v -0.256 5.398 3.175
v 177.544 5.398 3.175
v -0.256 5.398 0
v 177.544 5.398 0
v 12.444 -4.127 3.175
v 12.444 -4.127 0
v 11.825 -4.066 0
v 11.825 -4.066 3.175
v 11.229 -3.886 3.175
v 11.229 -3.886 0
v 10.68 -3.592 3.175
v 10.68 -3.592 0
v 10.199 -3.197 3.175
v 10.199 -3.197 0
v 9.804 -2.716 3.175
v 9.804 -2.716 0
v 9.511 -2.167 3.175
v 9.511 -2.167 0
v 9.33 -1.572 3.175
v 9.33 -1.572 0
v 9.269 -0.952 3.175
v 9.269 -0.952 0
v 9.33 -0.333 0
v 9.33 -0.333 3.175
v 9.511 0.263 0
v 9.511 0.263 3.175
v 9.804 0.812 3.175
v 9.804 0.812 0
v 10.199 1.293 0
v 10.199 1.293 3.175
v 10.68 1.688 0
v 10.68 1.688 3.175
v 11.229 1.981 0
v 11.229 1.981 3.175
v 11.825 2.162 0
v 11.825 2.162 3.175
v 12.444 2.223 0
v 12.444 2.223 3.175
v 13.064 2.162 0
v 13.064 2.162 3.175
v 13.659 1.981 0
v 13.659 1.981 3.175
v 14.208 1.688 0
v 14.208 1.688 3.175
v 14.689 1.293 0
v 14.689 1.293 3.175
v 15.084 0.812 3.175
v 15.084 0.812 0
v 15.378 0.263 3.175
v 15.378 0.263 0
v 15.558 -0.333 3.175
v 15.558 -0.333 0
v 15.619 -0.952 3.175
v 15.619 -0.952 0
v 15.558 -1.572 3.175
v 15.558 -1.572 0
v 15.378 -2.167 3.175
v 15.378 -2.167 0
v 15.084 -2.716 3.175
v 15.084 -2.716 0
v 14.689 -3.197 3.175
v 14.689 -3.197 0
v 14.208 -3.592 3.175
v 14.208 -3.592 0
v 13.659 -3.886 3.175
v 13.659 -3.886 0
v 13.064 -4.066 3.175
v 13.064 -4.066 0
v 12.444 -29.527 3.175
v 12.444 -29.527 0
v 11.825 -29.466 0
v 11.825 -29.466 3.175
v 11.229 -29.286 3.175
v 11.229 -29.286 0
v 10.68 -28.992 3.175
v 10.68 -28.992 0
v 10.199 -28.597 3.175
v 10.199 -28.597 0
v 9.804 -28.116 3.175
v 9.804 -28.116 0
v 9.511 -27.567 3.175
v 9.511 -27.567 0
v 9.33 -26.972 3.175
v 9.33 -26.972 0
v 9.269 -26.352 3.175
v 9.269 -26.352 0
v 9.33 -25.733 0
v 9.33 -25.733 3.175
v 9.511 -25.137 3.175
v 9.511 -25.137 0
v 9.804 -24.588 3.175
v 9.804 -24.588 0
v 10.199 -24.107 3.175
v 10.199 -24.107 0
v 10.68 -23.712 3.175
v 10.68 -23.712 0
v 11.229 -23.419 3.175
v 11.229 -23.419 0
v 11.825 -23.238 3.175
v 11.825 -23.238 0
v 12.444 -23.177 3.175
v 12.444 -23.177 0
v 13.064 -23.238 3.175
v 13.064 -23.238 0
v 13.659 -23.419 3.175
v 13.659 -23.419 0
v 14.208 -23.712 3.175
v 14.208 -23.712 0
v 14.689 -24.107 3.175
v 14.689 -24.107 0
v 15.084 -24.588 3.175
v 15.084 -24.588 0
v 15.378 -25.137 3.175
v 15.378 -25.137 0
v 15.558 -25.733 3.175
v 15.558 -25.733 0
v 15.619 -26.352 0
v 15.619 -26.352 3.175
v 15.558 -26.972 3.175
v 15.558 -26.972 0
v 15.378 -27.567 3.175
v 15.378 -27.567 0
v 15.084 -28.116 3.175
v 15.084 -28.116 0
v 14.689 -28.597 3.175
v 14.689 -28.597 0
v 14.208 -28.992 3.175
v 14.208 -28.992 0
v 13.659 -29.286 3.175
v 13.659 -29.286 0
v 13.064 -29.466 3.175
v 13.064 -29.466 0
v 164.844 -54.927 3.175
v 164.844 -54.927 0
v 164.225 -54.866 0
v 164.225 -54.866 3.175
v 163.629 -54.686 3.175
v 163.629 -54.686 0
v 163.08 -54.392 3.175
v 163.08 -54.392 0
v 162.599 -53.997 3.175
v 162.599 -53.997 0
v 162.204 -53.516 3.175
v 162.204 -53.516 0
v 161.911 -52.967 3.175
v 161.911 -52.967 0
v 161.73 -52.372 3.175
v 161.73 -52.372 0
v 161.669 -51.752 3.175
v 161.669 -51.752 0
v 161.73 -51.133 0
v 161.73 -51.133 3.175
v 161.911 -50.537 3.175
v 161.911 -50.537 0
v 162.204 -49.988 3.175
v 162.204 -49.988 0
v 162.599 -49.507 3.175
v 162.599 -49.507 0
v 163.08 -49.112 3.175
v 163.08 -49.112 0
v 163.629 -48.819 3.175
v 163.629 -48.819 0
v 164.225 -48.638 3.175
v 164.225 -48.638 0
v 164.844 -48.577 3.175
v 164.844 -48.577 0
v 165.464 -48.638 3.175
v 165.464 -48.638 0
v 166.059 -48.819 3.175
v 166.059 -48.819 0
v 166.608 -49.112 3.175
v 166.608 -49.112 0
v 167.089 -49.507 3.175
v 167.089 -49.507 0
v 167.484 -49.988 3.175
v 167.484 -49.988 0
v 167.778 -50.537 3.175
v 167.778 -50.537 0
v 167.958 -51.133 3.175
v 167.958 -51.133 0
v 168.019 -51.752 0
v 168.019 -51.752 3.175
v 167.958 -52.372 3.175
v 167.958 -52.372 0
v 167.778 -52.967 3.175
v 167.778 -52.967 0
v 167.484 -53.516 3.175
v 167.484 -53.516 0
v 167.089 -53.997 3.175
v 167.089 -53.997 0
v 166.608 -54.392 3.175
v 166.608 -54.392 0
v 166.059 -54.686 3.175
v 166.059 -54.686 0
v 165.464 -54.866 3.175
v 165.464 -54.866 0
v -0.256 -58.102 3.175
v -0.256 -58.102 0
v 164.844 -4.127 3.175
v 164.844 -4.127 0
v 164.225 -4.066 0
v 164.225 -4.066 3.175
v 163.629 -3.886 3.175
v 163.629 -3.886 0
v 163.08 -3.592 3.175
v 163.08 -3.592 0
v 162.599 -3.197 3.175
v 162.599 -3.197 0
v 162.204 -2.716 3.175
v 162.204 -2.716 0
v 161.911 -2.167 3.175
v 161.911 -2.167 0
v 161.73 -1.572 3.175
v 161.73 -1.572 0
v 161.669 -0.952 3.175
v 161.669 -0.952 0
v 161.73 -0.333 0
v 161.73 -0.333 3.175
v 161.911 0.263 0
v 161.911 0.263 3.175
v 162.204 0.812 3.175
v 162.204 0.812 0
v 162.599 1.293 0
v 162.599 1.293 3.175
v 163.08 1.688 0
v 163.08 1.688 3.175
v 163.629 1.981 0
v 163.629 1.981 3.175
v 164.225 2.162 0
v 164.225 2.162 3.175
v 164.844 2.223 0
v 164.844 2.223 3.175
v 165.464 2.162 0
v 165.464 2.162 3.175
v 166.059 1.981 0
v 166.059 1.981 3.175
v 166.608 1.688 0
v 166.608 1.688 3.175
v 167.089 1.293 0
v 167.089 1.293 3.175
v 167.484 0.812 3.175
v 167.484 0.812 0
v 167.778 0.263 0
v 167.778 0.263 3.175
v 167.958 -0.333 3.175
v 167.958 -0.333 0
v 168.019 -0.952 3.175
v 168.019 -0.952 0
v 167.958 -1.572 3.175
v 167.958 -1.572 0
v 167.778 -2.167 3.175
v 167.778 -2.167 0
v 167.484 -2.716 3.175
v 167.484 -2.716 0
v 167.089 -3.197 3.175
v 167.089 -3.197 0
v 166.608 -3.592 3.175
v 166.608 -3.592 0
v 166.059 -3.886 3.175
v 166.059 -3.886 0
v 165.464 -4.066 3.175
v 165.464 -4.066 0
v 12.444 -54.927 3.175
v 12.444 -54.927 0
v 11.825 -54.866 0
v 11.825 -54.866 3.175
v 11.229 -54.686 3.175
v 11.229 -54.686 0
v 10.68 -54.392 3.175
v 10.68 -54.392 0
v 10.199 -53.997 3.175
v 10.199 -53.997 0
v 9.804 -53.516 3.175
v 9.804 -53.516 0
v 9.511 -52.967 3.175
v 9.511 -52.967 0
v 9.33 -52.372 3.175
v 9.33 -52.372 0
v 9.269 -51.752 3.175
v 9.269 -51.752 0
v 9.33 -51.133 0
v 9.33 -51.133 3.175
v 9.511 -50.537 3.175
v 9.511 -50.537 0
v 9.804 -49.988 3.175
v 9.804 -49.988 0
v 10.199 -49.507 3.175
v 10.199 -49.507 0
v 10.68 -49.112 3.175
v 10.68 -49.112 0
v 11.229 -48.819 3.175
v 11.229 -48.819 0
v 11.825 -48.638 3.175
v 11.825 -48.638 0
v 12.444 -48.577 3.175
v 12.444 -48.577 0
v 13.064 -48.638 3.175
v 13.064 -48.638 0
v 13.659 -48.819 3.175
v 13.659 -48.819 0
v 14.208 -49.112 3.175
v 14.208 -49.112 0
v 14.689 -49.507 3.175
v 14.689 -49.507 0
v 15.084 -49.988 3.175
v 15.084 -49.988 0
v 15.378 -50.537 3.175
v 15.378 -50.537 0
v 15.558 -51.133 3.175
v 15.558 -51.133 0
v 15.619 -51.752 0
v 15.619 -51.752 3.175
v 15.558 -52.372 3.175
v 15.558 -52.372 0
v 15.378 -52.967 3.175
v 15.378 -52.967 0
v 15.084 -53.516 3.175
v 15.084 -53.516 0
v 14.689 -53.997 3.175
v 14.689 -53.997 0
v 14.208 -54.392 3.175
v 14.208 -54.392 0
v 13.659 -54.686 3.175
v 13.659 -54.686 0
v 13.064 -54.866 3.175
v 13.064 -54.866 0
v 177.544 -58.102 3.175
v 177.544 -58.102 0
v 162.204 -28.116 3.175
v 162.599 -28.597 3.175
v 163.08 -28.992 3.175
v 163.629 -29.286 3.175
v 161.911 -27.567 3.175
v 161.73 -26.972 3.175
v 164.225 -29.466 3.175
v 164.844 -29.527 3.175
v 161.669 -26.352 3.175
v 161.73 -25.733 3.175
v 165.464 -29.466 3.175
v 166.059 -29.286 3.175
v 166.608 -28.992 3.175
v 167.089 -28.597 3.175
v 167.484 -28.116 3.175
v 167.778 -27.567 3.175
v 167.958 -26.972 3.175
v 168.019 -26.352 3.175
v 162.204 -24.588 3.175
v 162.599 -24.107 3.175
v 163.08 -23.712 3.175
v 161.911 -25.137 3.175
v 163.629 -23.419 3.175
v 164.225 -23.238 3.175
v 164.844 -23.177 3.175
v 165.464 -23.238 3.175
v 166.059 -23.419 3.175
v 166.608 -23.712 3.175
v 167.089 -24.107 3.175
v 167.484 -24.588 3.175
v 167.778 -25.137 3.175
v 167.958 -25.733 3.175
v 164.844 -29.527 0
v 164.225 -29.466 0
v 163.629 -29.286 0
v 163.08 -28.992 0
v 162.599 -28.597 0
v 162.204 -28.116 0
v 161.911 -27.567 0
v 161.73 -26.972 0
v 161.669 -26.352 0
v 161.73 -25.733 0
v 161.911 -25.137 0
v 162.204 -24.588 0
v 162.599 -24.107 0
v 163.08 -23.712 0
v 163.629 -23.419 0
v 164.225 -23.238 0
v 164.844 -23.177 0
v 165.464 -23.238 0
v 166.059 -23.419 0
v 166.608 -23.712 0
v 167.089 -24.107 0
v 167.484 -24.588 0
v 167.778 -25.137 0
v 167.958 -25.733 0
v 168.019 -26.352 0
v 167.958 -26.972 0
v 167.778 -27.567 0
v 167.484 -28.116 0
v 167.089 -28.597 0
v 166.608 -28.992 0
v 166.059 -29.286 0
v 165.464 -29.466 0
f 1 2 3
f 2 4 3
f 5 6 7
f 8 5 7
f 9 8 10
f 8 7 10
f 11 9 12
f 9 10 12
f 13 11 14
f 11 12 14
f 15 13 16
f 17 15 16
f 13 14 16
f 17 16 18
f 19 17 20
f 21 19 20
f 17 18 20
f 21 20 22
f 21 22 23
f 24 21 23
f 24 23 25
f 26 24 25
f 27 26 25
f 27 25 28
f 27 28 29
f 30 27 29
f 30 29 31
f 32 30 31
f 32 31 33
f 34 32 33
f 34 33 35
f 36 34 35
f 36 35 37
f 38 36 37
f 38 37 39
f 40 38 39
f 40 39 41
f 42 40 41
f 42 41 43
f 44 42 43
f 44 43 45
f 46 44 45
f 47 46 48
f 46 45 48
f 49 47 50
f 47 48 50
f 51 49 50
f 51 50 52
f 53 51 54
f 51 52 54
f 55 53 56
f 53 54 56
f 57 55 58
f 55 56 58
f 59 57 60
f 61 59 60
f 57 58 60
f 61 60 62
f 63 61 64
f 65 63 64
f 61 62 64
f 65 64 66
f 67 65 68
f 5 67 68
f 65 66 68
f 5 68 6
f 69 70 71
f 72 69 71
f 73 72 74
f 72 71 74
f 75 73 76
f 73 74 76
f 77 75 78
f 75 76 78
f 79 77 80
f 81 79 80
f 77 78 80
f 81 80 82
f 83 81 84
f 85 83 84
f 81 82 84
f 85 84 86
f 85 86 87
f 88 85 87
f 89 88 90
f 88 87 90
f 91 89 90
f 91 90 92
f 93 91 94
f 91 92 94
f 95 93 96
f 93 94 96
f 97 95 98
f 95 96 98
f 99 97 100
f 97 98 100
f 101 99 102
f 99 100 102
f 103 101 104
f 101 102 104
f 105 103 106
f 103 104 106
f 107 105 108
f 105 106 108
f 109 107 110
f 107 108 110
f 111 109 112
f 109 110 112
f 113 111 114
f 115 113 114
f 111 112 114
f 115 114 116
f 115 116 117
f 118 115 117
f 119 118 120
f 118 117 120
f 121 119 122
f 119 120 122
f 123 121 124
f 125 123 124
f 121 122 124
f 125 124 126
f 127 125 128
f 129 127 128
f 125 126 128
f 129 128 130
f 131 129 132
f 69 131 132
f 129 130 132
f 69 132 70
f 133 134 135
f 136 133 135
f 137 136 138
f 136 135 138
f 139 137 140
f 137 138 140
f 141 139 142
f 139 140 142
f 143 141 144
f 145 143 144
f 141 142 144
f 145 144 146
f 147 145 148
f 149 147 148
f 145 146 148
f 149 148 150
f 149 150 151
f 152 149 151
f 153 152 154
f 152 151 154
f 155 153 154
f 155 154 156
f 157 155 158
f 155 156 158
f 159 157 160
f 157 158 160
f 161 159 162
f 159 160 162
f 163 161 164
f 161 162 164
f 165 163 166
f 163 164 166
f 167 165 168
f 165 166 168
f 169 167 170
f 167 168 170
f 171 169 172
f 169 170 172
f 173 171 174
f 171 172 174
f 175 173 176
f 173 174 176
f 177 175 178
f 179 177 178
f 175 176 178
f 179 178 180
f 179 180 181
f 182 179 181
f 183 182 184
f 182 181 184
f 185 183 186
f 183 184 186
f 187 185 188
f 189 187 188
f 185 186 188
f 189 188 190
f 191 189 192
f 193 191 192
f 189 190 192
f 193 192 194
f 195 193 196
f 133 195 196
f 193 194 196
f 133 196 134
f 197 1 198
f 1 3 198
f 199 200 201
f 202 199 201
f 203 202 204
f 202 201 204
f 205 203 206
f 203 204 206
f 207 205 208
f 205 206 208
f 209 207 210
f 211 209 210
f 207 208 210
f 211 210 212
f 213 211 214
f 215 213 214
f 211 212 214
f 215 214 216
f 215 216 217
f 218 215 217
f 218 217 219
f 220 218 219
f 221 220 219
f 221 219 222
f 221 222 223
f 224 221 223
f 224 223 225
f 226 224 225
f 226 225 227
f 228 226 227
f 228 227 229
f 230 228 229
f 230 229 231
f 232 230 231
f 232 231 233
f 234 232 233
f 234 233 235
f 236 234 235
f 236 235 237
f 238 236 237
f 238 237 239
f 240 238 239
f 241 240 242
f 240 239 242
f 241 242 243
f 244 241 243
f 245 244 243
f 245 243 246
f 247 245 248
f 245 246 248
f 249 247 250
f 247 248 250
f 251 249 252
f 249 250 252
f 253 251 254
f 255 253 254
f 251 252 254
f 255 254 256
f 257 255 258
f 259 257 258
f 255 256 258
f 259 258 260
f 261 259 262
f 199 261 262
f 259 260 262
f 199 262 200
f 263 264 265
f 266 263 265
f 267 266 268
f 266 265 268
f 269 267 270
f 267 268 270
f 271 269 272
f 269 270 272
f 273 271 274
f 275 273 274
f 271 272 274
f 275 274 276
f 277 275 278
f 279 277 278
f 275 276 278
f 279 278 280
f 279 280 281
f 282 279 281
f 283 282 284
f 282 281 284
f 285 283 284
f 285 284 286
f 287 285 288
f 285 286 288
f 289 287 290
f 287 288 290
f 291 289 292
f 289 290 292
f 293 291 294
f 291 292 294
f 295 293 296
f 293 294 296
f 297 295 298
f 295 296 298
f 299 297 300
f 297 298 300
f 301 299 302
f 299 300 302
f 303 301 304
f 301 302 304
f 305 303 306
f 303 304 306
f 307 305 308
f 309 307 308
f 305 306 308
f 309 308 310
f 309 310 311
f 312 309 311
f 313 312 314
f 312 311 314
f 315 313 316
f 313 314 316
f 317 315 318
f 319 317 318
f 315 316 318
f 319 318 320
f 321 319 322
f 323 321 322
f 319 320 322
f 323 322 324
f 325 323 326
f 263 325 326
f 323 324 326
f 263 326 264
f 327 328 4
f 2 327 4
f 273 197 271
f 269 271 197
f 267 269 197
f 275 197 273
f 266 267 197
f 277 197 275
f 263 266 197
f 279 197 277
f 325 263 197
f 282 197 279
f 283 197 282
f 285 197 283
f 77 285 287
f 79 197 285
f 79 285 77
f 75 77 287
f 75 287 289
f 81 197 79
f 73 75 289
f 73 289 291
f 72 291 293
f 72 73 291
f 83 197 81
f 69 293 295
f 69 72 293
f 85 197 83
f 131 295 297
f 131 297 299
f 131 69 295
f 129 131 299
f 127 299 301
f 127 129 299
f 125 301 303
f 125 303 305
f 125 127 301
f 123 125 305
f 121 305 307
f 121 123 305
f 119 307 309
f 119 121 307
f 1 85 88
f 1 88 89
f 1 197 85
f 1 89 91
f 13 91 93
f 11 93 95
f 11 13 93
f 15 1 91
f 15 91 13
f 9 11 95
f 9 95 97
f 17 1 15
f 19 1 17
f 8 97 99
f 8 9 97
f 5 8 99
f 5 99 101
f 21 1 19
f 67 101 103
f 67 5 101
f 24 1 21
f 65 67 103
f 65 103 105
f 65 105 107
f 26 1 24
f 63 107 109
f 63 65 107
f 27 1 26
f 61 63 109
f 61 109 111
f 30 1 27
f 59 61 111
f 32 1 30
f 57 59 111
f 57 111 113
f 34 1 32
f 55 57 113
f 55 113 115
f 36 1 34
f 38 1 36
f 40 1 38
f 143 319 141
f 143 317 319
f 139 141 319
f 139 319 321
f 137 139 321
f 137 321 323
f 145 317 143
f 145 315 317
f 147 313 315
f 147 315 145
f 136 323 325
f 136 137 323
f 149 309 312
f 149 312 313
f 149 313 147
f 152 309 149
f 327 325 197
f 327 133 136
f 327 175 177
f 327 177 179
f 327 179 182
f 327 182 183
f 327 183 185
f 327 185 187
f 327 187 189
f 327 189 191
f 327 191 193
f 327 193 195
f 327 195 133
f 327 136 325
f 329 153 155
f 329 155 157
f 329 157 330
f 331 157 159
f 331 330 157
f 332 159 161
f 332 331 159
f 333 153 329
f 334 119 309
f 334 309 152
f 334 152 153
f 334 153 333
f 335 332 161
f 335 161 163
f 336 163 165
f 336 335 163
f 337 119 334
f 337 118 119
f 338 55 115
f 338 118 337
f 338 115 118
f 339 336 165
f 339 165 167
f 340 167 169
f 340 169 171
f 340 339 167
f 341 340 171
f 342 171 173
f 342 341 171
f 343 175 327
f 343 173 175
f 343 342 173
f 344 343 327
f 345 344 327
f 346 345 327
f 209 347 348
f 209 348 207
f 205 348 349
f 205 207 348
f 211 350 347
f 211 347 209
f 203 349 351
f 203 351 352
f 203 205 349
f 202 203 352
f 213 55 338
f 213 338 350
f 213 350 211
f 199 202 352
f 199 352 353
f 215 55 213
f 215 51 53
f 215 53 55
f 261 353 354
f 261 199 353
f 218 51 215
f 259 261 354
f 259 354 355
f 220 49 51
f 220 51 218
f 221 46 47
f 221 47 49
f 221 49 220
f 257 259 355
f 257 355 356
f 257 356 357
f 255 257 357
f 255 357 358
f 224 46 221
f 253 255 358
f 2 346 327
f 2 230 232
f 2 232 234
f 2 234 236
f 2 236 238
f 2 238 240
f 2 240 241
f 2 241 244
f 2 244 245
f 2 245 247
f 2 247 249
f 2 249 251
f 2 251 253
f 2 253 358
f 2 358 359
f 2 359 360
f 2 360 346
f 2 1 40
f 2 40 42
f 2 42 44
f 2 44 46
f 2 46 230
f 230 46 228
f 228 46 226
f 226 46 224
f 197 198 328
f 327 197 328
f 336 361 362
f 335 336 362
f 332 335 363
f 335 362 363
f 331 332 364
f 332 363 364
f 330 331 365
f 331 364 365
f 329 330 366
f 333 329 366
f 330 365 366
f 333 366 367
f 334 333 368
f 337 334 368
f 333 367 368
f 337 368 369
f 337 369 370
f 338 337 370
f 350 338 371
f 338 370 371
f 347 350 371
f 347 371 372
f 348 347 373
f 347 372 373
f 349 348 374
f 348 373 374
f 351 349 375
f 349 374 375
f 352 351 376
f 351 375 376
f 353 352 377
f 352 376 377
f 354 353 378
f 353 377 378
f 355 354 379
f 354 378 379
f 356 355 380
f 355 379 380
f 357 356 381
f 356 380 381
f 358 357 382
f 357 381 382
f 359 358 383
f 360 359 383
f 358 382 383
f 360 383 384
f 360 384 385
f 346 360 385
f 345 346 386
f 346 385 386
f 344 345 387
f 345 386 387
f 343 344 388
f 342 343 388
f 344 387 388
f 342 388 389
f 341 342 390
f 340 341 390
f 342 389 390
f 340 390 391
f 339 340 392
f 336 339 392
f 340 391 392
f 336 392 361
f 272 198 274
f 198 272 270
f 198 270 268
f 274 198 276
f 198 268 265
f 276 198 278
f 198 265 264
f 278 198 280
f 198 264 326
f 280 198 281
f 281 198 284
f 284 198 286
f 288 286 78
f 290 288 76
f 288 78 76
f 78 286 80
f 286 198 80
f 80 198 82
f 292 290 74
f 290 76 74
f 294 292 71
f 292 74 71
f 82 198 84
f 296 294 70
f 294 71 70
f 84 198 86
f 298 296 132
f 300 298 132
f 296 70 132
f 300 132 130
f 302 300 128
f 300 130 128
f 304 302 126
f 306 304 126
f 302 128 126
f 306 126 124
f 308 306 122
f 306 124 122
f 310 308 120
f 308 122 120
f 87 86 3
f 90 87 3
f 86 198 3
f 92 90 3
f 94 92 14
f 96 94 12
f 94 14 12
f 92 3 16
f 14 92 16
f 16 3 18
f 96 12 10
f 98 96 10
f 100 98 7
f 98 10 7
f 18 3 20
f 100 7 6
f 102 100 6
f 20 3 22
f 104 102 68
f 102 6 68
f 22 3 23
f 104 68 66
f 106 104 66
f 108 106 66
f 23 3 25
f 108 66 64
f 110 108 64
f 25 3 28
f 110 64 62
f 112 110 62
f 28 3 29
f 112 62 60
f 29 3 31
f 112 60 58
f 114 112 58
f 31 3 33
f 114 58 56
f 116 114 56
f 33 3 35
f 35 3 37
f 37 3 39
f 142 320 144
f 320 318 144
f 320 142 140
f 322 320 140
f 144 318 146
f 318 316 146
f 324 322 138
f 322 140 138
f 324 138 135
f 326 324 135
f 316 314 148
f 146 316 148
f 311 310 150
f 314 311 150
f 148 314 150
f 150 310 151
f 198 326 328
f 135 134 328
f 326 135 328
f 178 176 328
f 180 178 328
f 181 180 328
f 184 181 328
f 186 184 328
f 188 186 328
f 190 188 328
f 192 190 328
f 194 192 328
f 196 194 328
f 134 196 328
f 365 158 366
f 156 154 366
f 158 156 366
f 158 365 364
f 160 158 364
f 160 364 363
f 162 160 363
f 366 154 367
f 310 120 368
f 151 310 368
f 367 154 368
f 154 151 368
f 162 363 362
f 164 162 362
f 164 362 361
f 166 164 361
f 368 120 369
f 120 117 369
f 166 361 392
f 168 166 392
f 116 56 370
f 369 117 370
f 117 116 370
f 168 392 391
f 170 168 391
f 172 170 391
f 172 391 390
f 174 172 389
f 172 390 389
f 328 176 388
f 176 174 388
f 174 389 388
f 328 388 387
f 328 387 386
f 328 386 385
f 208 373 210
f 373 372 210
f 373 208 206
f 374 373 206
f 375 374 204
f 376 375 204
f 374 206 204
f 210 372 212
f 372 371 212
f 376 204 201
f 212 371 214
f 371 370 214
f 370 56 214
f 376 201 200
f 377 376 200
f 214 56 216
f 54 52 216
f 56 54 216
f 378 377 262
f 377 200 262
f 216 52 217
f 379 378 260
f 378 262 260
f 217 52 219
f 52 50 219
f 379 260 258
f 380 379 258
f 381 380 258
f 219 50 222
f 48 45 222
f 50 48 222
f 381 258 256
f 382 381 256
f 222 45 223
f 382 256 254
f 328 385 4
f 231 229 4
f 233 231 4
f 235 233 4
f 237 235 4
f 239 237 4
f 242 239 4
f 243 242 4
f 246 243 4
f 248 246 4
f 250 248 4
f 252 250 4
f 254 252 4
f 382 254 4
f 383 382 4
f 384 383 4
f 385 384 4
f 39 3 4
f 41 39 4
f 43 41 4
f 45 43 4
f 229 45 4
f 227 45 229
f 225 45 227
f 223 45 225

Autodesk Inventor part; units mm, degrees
ref_plane "YZ Plane" through (0, 0, 0) normal (1, 0, 0) x (0, 1, 0)
ref_plane "XZ Plane" through (0, 0, 0) normal (0, 1, 0) x (-1, 0, 0)
ref_plane "XY Plane" through (0, 0, 0) normal (0, 0, 1) x (1, 0, 0)
sketch "Sketch1" plane through (0, 0, 0) normal (0, 0, 1) x (1, 0, 0)
  line L0 (-0.2558, -58.1023) -> (177.5442, -58.1023)
  line L1 (177.5442, -58.1023) -> (177.5442, 5.3977)
  line L2 (177.5442, 5.3977) -> (-0.2558, 5.3977)
  line L3 (-0.2558, 5.3977) -> (-0.2558, -58.1023)
  point P0 (0, 0)
  dimension "d0" = 177.8
  dimension "d1" = 63.5
extrude "Extrusion1" add sketch "Sketch1" along normal blind 3.175
sketch "Sketch3" plane through (0, 0, 3.175) normal (0, 0, 1) x (1, 0, 0)
  line L0 (-0.2558, 5.3977) -> (-0.2558, -58.1023) projected
  line L1 (177.5442, 5.3977) -> (-0.2558, 5.3977) projected
  line L2 (-0.2558, -58.1023) -> (177.5442, -58.1023) projected
  line L3 (177.5442, -58.1023) -> (177.5442, 5.3977) projected
  point P0 (0, 0)
  point P1 (12.4442, -0.9523)
  point P2 (12.4442, -26.3523)
  point P3 (12.4442, -51.7523)
  point P4 (164.8442, -0.9523)
  point P5 (164.8442, -26.3523)
  point P6 (164.8442, -51.7523)
  dimension "d22" = 25.4
  dimension "d23" = 25.4
  dimension "d26" = 12.7
  dimension "d27" = 12.7
  dimension "d28" = 12.7
  dimension "d29" = 6.35
  dimension "d30" = 6.35
  dimension "d33" = 6.35
  dimension "d34" = 25.4
  dimension "d35" = 25.4
  dimension "d36" = 12.7
hole "Hole2" at (12.4442, -0.9523, 3.175) at (12.4442, -26.3523, 3.175) at (12.4442, -51.7523, 3.175) at (164.8442, -0.9523, 3.175) at (164.8442, -26.3523, 3.175) at (164.8442, -51.7523, 3.175) direction (0, 0, -1) diameter 6.35 end through all
properties part number "base and top plate real"
